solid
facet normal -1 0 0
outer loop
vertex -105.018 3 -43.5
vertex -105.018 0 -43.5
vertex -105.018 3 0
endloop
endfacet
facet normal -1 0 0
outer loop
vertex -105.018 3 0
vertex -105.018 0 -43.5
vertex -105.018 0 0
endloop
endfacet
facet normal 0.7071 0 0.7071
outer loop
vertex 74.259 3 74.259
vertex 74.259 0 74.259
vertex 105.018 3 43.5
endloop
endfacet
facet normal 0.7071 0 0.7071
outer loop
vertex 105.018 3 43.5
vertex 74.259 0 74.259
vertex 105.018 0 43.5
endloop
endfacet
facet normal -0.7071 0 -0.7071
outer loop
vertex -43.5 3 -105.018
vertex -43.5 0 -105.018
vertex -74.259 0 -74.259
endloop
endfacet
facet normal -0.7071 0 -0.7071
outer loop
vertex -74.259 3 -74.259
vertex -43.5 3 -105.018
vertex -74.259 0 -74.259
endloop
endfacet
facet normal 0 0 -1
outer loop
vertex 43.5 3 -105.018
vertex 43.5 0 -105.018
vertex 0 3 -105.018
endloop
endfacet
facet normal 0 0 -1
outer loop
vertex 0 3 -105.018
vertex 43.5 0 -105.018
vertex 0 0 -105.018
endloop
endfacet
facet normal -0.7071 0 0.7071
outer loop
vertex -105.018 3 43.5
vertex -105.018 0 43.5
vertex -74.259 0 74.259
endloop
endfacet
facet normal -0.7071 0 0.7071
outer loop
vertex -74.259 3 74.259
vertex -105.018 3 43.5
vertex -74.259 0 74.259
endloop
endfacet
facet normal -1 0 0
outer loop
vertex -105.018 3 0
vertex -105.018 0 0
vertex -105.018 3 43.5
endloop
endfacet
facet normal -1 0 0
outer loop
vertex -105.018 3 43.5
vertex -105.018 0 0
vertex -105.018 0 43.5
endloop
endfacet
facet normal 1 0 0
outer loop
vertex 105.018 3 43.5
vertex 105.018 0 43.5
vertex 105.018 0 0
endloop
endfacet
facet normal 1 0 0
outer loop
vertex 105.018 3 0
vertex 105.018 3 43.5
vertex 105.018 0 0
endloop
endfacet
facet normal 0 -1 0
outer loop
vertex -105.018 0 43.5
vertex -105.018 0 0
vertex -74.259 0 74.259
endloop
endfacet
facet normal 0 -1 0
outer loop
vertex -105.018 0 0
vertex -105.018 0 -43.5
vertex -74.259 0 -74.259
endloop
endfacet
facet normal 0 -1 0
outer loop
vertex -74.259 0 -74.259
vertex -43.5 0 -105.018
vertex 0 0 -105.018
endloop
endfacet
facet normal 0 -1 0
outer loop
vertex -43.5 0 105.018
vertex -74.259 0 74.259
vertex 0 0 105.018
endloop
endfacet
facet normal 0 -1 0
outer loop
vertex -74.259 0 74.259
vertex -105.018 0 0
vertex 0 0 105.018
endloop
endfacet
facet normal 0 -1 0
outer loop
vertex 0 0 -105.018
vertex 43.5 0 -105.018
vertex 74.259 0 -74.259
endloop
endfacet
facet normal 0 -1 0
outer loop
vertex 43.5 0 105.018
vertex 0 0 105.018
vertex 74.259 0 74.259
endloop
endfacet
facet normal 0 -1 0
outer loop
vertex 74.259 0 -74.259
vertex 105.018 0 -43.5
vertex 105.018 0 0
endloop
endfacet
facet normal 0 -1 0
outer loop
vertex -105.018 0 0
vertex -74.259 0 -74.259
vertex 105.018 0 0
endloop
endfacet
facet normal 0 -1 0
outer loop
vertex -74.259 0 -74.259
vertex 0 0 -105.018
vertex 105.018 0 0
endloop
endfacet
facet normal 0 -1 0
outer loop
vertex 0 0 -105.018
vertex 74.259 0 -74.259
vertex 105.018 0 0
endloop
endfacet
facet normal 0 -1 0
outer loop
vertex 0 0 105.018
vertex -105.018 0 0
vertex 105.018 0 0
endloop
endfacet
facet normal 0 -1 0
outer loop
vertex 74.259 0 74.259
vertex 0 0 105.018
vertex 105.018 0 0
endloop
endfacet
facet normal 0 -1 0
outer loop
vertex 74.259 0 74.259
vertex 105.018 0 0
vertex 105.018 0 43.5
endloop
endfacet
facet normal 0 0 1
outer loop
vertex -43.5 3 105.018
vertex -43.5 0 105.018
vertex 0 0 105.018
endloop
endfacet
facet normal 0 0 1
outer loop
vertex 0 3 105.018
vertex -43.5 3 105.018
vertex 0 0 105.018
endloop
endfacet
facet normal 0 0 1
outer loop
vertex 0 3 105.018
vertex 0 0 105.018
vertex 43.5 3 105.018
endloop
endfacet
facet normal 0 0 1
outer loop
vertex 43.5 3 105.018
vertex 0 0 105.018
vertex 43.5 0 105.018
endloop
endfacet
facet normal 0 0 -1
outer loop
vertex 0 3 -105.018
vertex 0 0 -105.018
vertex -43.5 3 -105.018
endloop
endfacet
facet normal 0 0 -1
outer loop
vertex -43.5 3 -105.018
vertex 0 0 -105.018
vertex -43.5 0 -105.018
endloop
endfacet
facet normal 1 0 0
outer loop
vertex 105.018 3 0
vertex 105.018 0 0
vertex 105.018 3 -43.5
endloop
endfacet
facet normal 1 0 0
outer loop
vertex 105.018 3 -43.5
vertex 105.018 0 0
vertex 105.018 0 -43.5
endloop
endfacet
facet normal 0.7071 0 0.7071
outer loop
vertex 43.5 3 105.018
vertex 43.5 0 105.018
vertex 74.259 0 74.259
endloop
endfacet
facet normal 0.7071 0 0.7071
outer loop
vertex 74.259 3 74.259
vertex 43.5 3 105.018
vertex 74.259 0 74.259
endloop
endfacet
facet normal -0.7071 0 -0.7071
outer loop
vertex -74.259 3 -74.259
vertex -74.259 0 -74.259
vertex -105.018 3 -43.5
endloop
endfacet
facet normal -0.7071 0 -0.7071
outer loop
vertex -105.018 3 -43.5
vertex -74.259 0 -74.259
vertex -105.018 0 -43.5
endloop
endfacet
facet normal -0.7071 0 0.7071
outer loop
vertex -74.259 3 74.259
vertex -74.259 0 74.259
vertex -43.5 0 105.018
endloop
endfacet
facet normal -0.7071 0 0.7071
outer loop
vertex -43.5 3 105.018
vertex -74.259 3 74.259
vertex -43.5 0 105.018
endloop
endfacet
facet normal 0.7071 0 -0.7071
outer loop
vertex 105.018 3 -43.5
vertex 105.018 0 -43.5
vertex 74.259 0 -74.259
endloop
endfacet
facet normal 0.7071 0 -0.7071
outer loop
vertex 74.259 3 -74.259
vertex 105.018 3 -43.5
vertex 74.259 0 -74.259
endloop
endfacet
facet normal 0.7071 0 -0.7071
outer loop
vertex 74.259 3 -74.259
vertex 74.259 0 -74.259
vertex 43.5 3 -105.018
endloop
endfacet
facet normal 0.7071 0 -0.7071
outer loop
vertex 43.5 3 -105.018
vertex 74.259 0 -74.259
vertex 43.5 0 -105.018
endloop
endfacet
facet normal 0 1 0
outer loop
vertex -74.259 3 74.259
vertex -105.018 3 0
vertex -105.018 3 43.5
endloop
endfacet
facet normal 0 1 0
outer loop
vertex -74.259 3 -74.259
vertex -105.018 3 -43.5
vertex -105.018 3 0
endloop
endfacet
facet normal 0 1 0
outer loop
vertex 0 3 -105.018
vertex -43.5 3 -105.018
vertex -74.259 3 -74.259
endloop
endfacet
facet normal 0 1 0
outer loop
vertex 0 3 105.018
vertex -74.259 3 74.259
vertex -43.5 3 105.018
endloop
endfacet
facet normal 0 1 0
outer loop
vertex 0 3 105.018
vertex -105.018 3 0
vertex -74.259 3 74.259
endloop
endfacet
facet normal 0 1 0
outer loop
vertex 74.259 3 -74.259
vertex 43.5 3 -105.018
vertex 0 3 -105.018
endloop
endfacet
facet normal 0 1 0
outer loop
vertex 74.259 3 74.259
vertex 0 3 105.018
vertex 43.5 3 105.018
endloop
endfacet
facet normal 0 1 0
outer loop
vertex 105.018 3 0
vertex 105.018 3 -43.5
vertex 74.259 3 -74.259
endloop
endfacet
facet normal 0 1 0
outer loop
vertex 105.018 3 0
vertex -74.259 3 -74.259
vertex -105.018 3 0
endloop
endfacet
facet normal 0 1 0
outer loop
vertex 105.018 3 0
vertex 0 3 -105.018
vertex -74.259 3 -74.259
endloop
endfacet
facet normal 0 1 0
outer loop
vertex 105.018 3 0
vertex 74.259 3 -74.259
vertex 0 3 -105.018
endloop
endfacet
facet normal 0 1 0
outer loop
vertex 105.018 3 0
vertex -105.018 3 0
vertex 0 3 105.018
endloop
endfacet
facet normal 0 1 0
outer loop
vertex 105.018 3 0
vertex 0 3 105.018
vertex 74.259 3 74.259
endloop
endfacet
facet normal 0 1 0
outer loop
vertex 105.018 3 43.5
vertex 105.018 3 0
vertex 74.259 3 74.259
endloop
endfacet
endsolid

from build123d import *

# Parameters (mm, degrees)
BOSS_EXTRUDE1_DEPTH = 3
CIRPATTERN1_COUNT   = 8


with BuildPart() as part:
    # Sketch1 → Boss-Extrude1 (new body)
    with BuildSketch(Plane(origin=(0, 0, 0), x_dir=(1, 0, 0), z_dir=(0, 1, 0))):
        Polygon((0, 0), (105.018289963, 0), (105.018289963, 43.5), (74.259144982, 74.259144982), align=None)
    boss_extrude1 = extrude(amount=BOSS_EXTRUDE1_DEPTH)

    # CirPattern1: Boss-Extrude1 ×8 about axis
    cirpattern1_axis = Axis((0, 0, 0), (0, 1, 0))
    for i in range(1, CIRPATTERN1_COUNT):
        add(boss_extrude1.rotate(cirpattern1_axis, i * 360 / CIRPATTERN1_COUNT))


solid = part.part
